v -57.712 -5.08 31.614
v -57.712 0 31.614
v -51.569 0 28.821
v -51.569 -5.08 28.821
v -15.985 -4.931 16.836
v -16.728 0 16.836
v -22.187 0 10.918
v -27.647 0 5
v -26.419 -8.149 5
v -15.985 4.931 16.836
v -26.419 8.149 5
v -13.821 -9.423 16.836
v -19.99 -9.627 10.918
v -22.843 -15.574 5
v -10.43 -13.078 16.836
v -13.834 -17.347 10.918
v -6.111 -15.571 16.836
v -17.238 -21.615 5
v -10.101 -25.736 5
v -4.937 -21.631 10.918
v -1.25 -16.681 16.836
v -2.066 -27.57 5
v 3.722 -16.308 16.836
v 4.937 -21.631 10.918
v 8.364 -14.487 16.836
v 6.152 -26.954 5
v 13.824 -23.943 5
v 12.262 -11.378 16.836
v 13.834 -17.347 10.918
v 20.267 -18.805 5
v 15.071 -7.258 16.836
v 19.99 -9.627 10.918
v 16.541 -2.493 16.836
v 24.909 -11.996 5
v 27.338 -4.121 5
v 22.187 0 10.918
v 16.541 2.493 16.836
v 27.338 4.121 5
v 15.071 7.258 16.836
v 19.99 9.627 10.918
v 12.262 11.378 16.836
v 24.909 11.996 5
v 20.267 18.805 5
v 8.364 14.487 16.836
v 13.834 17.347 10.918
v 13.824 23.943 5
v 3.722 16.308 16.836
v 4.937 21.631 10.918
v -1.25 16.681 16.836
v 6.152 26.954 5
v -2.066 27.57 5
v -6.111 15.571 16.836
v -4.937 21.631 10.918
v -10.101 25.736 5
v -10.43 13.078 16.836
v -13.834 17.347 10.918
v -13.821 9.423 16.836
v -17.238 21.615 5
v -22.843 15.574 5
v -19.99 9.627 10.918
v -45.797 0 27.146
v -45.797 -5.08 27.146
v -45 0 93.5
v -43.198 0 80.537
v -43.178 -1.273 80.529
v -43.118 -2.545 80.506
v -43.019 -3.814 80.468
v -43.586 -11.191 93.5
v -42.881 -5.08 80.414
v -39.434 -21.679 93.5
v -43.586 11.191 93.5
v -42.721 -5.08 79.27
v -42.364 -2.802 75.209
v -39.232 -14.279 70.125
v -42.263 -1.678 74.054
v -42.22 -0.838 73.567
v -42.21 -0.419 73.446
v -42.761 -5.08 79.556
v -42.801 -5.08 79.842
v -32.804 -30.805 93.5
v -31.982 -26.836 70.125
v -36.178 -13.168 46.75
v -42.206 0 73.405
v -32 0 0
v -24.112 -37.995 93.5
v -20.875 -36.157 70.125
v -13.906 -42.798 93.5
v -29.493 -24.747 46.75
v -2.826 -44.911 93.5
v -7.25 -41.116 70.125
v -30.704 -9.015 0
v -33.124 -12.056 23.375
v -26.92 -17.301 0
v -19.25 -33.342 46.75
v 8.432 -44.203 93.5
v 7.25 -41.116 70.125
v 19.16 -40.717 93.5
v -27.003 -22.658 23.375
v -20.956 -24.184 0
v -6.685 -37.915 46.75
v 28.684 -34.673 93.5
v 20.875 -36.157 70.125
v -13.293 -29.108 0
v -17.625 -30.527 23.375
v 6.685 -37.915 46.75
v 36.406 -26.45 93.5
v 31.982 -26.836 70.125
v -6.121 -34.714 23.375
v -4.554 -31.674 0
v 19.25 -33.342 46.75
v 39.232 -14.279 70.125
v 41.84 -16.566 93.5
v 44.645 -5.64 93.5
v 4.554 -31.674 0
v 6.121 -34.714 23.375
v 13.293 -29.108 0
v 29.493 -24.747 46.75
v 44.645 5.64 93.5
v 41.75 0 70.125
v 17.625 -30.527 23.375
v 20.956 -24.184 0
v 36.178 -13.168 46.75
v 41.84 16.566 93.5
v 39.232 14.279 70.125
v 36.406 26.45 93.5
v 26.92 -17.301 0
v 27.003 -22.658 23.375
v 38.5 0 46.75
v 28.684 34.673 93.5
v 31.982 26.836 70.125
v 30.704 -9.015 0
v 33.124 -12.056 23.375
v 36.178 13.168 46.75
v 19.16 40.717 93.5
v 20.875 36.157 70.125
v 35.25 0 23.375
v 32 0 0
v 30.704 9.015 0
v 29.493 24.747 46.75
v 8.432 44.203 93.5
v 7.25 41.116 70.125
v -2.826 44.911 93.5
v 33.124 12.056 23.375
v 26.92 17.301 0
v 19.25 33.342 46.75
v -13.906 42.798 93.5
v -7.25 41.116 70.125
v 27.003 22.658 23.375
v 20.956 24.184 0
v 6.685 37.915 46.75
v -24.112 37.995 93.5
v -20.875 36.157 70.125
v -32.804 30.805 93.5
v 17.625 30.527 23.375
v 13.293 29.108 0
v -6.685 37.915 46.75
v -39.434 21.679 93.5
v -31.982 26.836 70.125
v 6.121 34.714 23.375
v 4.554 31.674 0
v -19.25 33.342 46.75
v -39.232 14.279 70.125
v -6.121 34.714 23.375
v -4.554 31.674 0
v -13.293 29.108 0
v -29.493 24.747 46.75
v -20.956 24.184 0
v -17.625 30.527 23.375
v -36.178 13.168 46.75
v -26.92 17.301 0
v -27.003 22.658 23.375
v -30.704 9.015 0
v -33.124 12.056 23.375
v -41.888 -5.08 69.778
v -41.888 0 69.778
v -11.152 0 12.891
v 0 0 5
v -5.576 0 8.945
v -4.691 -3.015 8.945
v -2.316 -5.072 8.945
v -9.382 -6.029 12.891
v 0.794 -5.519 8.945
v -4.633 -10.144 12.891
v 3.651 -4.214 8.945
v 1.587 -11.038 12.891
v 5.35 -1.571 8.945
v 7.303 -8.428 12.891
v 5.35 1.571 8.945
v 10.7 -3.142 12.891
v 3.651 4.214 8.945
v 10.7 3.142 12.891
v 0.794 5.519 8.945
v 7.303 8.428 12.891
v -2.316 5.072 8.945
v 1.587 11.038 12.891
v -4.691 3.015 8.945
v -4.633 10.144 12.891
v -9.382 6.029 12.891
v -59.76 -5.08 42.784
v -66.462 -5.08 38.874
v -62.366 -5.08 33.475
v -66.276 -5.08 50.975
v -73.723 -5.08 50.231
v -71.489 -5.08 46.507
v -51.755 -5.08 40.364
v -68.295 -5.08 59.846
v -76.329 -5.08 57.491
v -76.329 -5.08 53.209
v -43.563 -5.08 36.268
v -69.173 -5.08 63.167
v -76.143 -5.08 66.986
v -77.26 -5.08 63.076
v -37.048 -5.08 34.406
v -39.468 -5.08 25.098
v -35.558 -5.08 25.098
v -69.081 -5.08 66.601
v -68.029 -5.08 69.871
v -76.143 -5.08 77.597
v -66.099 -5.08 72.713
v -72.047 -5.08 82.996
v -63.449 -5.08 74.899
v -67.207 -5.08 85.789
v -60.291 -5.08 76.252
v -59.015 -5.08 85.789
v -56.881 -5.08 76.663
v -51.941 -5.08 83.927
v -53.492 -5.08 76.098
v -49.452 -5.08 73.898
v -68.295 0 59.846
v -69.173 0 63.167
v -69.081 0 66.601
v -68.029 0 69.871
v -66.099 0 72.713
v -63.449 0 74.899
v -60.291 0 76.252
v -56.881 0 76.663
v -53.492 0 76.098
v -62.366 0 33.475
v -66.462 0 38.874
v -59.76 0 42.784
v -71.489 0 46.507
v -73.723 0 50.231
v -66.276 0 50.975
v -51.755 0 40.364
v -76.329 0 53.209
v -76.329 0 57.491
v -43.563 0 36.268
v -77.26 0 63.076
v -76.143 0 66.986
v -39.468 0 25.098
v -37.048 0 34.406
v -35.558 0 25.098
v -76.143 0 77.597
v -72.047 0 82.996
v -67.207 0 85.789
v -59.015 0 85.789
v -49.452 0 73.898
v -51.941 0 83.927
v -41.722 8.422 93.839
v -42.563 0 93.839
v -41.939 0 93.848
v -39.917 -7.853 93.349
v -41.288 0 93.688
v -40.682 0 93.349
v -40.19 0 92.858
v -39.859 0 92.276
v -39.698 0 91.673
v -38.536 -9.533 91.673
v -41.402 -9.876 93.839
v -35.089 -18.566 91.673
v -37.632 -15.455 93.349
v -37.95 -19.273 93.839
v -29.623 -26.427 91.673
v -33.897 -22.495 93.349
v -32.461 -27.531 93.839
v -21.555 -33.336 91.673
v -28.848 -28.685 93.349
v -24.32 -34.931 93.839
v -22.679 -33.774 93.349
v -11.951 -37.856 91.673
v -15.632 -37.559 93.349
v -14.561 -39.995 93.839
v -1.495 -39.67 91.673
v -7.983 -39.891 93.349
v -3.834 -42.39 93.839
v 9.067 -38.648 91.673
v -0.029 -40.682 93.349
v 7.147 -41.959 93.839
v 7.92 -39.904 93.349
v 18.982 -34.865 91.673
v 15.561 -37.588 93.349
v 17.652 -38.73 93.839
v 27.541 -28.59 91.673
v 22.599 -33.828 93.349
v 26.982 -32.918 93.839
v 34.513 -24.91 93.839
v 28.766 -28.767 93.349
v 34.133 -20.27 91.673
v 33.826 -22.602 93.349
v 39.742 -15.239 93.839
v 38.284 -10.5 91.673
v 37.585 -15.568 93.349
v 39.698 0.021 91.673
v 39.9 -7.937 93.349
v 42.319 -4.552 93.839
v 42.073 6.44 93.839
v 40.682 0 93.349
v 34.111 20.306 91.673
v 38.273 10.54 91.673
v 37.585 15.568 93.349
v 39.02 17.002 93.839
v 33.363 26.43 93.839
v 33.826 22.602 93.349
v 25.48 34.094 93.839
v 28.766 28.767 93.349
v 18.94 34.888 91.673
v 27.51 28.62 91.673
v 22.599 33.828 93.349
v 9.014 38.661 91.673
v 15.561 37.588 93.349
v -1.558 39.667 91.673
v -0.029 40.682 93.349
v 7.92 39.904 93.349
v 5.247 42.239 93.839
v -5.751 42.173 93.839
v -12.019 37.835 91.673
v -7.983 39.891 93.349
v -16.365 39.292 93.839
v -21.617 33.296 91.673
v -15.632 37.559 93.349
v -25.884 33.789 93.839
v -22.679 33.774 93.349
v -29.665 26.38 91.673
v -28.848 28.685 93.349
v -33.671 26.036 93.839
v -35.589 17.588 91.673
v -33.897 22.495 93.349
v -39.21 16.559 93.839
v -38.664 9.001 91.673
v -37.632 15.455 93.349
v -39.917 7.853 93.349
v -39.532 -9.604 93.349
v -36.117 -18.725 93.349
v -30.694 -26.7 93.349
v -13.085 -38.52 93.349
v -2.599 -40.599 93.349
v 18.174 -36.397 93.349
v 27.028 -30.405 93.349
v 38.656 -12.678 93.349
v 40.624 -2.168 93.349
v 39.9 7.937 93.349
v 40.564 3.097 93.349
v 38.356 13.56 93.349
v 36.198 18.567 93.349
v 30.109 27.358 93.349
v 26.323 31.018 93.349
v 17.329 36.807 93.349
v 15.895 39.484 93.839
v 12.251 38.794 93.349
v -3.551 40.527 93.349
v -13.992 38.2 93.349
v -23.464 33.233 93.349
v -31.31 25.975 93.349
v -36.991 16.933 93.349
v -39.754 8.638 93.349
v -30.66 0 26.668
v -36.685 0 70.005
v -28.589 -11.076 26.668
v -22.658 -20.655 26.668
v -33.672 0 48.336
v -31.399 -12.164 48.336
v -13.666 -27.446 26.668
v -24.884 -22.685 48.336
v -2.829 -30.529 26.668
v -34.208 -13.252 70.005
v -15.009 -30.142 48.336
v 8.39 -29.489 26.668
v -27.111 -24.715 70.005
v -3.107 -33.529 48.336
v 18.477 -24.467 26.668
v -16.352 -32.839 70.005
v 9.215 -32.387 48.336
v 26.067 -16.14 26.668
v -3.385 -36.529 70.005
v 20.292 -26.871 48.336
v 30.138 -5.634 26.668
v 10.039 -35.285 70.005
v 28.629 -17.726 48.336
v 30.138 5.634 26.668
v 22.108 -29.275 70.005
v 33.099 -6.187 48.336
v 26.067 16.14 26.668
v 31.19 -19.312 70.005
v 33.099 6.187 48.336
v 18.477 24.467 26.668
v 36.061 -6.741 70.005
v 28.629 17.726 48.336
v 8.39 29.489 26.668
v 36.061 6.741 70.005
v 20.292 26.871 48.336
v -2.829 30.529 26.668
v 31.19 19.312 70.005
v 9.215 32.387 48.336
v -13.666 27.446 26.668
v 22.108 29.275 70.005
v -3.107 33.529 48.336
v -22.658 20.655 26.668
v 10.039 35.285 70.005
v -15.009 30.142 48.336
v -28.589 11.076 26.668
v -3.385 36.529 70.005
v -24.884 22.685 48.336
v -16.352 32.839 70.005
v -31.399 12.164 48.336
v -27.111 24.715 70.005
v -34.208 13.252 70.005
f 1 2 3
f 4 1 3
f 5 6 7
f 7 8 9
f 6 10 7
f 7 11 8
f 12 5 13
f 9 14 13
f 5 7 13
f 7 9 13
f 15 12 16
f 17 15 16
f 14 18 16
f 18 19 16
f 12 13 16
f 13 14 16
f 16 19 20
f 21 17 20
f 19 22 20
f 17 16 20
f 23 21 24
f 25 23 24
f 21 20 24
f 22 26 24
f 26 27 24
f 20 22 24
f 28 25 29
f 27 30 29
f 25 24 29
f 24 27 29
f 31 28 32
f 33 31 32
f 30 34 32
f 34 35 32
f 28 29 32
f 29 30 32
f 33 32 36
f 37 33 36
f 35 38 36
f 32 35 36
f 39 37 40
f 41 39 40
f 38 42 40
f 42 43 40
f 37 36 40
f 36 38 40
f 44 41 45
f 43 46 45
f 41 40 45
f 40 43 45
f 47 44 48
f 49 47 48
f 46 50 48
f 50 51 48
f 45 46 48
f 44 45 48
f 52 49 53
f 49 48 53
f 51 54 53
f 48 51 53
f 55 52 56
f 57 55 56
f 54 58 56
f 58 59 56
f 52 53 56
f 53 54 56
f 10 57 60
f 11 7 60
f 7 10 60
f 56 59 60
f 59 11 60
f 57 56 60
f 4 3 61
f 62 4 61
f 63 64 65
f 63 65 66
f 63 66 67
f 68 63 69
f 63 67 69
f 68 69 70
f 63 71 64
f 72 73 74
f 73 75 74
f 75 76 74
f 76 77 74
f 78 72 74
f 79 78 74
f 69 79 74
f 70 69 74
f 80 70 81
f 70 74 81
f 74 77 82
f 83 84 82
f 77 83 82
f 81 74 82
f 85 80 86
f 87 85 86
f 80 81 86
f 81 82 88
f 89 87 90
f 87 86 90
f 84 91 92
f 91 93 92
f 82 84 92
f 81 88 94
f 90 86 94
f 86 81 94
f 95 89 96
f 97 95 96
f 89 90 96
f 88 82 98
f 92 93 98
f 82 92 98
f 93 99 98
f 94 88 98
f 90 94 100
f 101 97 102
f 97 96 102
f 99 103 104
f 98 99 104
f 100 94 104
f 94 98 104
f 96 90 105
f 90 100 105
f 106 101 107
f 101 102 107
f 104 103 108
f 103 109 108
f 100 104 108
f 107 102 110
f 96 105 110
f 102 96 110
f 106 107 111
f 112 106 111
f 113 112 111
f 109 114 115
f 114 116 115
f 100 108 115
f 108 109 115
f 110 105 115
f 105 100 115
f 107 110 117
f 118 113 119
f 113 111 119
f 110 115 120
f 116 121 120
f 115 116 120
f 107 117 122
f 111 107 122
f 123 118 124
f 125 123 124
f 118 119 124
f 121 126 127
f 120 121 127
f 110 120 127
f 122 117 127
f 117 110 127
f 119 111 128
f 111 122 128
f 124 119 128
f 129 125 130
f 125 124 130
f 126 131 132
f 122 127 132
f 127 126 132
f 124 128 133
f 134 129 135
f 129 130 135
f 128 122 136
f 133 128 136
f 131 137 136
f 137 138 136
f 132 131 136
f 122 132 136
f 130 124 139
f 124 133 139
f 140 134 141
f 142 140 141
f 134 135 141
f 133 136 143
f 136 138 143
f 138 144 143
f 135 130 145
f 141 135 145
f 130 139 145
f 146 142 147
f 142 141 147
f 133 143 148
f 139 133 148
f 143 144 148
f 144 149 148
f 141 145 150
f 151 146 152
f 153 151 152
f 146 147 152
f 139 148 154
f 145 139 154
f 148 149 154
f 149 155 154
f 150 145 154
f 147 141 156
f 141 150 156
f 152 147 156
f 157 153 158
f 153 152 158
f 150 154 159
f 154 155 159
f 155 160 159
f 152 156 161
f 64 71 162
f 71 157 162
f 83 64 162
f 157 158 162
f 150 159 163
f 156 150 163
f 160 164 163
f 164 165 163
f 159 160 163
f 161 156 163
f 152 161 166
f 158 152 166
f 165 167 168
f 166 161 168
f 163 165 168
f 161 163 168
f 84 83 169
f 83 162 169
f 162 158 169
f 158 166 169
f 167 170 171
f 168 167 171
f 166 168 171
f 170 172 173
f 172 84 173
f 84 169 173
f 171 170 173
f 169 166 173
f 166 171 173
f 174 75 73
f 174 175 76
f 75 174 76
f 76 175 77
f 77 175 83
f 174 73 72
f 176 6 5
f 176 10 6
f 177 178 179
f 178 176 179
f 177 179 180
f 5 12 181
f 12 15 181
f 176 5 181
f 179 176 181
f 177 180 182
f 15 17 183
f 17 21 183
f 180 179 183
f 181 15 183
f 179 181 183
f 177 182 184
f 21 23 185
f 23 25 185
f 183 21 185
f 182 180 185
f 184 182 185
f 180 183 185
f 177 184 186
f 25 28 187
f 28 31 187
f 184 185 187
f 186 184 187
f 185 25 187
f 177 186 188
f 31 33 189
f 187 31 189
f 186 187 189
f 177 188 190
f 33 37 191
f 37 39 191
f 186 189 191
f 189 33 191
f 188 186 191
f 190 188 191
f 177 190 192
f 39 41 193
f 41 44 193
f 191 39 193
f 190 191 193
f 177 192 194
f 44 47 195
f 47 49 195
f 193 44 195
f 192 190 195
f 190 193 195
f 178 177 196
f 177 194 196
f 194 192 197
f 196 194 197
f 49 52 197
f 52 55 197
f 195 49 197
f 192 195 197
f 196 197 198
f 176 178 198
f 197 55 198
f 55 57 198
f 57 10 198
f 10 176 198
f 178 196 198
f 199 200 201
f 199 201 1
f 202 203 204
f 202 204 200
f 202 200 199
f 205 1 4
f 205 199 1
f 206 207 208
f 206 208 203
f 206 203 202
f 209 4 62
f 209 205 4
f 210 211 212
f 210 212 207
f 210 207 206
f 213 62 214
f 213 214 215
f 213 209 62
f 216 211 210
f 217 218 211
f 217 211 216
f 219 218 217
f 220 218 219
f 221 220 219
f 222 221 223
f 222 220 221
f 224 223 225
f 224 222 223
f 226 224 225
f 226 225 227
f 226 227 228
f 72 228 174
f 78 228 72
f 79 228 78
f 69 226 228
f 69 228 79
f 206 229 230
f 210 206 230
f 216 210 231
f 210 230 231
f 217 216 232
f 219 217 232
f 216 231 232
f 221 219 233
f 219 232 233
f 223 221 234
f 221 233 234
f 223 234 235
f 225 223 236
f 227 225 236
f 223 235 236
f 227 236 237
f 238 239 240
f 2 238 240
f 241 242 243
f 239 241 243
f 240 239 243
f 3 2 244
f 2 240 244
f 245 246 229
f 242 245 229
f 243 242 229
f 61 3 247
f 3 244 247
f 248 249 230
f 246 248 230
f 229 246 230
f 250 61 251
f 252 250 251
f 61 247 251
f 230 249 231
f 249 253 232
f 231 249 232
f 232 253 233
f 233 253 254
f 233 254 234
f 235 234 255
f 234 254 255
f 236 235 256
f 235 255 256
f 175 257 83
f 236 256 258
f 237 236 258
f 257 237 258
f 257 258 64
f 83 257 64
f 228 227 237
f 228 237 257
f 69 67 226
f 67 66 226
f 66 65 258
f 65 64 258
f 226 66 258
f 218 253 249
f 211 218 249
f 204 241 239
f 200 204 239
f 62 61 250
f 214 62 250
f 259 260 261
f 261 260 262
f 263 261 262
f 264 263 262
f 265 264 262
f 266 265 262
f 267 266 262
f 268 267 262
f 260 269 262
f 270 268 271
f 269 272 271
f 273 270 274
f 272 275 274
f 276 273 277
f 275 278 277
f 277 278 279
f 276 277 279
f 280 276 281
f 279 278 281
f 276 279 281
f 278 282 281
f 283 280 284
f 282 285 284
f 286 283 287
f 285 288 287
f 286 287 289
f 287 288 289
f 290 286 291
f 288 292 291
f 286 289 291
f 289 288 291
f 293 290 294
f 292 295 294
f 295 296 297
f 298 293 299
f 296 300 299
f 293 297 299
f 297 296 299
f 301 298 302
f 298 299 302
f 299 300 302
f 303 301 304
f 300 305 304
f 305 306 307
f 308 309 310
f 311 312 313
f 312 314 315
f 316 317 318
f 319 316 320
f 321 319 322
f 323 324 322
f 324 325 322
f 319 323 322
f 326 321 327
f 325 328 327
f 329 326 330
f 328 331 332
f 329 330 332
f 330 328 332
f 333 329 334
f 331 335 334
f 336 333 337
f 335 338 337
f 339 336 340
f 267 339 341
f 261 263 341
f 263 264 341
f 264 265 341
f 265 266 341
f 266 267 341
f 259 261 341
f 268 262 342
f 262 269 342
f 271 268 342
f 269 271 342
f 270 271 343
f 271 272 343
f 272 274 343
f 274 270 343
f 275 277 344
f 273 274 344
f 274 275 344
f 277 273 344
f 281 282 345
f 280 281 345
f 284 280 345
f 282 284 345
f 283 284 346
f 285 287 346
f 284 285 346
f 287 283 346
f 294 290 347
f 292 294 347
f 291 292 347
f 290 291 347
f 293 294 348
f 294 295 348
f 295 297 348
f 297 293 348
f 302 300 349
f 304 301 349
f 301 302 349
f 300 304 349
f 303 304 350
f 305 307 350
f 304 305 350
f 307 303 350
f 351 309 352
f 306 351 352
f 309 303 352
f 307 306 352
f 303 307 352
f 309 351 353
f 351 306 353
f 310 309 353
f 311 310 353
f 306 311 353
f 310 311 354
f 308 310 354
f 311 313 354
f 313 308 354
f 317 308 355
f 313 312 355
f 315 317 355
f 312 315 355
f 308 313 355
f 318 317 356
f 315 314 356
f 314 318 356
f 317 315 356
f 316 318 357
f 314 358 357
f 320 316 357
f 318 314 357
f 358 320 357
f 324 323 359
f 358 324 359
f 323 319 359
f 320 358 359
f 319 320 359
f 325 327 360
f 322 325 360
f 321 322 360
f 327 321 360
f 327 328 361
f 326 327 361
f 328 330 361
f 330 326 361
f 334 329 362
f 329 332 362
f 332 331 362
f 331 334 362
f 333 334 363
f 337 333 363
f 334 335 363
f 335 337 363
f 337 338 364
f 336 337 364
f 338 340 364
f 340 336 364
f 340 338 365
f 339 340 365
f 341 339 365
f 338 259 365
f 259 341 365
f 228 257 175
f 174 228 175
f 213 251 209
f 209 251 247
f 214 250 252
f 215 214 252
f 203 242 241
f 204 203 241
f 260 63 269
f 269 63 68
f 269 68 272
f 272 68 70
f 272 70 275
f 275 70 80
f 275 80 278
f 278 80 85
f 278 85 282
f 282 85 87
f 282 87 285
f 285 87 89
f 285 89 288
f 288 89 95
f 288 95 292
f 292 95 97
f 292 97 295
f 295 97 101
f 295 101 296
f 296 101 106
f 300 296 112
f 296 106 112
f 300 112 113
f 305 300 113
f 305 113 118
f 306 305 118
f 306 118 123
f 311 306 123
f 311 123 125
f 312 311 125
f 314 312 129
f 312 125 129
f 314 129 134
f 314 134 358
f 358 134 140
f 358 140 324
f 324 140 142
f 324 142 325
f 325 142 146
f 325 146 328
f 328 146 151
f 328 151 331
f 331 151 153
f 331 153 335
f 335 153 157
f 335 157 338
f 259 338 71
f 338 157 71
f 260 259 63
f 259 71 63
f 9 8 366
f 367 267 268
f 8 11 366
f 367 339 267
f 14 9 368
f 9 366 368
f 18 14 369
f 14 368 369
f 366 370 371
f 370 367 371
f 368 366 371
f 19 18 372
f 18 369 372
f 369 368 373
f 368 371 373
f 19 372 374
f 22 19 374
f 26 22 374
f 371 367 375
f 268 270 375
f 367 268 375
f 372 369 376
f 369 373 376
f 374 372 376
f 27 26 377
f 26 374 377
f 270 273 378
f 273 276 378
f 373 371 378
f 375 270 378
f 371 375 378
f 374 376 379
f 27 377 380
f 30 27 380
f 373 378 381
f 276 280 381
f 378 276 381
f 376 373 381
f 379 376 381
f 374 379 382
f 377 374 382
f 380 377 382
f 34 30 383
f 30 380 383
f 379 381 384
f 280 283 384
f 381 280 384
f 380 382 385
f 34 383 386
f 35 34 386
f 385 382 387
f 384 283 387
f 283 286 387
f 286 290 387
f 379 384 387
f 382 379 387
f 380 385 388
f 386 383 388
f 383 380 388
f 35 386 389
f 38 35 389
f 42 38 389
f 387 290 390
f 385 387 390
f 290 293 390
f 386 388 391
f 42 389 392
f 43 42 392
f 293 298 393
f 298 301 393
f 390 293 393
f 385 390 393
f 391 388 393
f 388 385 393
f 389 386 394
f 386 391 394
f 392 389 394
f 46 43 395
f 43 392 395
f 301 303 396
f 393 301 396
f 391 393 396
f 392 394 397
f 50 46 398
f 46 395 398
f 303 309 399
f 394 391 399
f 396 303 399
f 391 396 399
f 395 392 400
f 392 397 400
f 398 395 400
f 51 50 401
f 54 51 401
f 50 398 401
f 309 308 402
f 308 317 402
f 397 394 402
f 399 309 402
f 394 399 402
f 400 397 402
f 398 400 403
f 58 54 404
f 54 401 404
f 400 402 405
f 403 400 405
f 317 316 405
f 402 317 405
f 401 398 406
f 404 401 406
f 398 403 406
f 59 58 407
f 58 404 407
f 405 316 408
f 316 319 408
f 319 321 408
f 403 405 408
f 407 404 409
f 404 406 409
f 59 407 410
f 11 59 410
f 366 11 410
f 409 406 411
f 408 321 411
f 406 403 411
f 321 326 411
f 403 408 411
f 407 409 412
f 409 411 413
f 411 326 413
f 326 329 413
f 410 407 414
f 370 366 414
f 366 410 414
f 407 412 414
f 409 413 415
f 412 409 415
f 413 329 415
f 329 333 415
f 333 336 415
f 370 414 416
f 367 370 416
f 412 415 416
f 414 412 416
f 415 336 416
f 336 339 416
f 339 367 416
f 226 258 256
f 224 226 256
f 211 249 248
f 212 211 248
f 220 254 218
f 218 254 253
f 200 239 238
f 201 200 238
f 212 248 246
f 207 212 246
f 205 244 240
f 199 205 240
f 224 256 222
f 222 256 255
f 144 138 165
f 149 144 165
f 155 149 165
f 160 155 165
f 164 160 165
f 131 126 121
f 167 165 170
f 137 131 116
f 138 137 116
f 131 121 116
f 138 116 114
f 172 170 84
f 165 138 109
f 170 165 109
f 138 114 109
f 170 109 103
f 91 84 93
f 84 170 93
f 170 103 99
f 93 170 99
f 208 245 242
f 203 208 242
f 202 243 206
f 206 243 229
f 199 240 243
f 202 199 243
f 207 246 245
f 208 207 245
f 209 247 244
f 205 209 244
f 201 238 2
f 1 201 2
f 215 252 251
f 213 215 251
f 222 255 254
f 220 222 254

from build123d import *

# Parameters (mm, degrees)
F3_DEPTH = 5.08
F4_R     = 2.54


with BuildPart() as f1:
    # F0 (on Front) → F1 (revolve)
    with BuildSketch(Plane.XZ):
        Polygon((-32, 0), (0, 0), (0, 5), (-27.64709, 5), (-40.047639, 94.188564), (-45, 93.5), align=None)
        Polygon((-27.64709, 5), (0, 5), (-16.727764, 16.835798), align=None)
    revolve(axis=Axis((0, 0, 46.75), (0, 0, 1)))

    # F2 (on Front) → F3 (join)
    with BuildSketch(Plane.XZ):
        with BuildLine():
            ThreePointArc((-68.295348, 59.845981), (-66.09924, 72.713495), (-53.492135, 76.098273))
            ThreePointArc((-53.492135, 76.098273), (-51.366423, 75.191833), (-49.451803, 73.897802))
            Line((-49.451803, 73.897802), (-41.887928, 69.778316))
            Line((-41.887928, 69.778316), (-42.81877, 80.389924))
            Line((-42.81877, 80.389924), (-51.94103, 83.927125))
            Line((-51.94103, 83.927125), (-59.015434, 85.788816))
            Line((-59.015434, 85.788816), (-67.206852, 85.788816))
            Line((-67.206852, 85.788816), (-72.047234, 82.996286))
            Line((-72.047234, 82.996286), (-76.142944, 77.597402))
            Line((-76.142944, 77.597402), (-76.142944, 72.943188))
            Line((-76.142944, 72.943188), (-76.142944, 66.985793))
            Line((-76.142944, 66.985793), (-77.259958, 63.07625))
            Line((-77.259958, 63.07625), (-76.329112, 57.491191))
            Line((-76.329112, 57.491191), (-76.329112, 53.209316))
            Line((-76.329112, 53.209316), (-73.72275, 50.230619))
            Line((-73.72275, 50.230619), (-71.488731, 46.507247))
            Line((-71.488731, 46.507247), (-66.462182, 38.874336))
            Line((-66.462182, 38.874336), (-62.366471, 33.475447))
            Line((-62.366471, 33.475447), (-57.712257, 31.61376))
            Line((-57.712257, 31.61376), (-51.568694, 28.821234))
            Line((-51.568694, 28.821234), (-45.797467, 27.145715))
            Line((-45.797467, 27.145715), (-39.467737, 25.097862))
            Line((-39.467737, 25.097862), (-35.558198, 25.097862))
            Line((-35.558198, 25.097862), (-37.047546, 34.406289))
            Line((-37.047546, 34.406289), (-43.563444, 36.267977))
            Line((-43.563444, 36.267977), (-51.754862, 40.363684))
            Line((-51.754862, 40.363684), (-59.760112, 42.783875))
            Line((-59.760112, 42.783875), (-66.276014, 50.975293))
            Line((-66.276014, 50.975293), (-68.295348, 59.845981))
        make_face()
        with BuildLine():
            ThreePointArc((-49.451803, 73.897802), (-51.366423, 75.191833), (-53.492135, 76.098273))
            Line((-53.492135, 76.098273), (-49.451803, 73.897802))
        make_face()
    extrude(amount=F3_DEPTH)

    # F4
    f4_edges = [f1.edges().sort_by_distance(p)[0] for p in [
        (40.047639, 0, 94.188564),
    ]]
    fillet(f4_edges, radius=F4_R)


solid = f1.part
